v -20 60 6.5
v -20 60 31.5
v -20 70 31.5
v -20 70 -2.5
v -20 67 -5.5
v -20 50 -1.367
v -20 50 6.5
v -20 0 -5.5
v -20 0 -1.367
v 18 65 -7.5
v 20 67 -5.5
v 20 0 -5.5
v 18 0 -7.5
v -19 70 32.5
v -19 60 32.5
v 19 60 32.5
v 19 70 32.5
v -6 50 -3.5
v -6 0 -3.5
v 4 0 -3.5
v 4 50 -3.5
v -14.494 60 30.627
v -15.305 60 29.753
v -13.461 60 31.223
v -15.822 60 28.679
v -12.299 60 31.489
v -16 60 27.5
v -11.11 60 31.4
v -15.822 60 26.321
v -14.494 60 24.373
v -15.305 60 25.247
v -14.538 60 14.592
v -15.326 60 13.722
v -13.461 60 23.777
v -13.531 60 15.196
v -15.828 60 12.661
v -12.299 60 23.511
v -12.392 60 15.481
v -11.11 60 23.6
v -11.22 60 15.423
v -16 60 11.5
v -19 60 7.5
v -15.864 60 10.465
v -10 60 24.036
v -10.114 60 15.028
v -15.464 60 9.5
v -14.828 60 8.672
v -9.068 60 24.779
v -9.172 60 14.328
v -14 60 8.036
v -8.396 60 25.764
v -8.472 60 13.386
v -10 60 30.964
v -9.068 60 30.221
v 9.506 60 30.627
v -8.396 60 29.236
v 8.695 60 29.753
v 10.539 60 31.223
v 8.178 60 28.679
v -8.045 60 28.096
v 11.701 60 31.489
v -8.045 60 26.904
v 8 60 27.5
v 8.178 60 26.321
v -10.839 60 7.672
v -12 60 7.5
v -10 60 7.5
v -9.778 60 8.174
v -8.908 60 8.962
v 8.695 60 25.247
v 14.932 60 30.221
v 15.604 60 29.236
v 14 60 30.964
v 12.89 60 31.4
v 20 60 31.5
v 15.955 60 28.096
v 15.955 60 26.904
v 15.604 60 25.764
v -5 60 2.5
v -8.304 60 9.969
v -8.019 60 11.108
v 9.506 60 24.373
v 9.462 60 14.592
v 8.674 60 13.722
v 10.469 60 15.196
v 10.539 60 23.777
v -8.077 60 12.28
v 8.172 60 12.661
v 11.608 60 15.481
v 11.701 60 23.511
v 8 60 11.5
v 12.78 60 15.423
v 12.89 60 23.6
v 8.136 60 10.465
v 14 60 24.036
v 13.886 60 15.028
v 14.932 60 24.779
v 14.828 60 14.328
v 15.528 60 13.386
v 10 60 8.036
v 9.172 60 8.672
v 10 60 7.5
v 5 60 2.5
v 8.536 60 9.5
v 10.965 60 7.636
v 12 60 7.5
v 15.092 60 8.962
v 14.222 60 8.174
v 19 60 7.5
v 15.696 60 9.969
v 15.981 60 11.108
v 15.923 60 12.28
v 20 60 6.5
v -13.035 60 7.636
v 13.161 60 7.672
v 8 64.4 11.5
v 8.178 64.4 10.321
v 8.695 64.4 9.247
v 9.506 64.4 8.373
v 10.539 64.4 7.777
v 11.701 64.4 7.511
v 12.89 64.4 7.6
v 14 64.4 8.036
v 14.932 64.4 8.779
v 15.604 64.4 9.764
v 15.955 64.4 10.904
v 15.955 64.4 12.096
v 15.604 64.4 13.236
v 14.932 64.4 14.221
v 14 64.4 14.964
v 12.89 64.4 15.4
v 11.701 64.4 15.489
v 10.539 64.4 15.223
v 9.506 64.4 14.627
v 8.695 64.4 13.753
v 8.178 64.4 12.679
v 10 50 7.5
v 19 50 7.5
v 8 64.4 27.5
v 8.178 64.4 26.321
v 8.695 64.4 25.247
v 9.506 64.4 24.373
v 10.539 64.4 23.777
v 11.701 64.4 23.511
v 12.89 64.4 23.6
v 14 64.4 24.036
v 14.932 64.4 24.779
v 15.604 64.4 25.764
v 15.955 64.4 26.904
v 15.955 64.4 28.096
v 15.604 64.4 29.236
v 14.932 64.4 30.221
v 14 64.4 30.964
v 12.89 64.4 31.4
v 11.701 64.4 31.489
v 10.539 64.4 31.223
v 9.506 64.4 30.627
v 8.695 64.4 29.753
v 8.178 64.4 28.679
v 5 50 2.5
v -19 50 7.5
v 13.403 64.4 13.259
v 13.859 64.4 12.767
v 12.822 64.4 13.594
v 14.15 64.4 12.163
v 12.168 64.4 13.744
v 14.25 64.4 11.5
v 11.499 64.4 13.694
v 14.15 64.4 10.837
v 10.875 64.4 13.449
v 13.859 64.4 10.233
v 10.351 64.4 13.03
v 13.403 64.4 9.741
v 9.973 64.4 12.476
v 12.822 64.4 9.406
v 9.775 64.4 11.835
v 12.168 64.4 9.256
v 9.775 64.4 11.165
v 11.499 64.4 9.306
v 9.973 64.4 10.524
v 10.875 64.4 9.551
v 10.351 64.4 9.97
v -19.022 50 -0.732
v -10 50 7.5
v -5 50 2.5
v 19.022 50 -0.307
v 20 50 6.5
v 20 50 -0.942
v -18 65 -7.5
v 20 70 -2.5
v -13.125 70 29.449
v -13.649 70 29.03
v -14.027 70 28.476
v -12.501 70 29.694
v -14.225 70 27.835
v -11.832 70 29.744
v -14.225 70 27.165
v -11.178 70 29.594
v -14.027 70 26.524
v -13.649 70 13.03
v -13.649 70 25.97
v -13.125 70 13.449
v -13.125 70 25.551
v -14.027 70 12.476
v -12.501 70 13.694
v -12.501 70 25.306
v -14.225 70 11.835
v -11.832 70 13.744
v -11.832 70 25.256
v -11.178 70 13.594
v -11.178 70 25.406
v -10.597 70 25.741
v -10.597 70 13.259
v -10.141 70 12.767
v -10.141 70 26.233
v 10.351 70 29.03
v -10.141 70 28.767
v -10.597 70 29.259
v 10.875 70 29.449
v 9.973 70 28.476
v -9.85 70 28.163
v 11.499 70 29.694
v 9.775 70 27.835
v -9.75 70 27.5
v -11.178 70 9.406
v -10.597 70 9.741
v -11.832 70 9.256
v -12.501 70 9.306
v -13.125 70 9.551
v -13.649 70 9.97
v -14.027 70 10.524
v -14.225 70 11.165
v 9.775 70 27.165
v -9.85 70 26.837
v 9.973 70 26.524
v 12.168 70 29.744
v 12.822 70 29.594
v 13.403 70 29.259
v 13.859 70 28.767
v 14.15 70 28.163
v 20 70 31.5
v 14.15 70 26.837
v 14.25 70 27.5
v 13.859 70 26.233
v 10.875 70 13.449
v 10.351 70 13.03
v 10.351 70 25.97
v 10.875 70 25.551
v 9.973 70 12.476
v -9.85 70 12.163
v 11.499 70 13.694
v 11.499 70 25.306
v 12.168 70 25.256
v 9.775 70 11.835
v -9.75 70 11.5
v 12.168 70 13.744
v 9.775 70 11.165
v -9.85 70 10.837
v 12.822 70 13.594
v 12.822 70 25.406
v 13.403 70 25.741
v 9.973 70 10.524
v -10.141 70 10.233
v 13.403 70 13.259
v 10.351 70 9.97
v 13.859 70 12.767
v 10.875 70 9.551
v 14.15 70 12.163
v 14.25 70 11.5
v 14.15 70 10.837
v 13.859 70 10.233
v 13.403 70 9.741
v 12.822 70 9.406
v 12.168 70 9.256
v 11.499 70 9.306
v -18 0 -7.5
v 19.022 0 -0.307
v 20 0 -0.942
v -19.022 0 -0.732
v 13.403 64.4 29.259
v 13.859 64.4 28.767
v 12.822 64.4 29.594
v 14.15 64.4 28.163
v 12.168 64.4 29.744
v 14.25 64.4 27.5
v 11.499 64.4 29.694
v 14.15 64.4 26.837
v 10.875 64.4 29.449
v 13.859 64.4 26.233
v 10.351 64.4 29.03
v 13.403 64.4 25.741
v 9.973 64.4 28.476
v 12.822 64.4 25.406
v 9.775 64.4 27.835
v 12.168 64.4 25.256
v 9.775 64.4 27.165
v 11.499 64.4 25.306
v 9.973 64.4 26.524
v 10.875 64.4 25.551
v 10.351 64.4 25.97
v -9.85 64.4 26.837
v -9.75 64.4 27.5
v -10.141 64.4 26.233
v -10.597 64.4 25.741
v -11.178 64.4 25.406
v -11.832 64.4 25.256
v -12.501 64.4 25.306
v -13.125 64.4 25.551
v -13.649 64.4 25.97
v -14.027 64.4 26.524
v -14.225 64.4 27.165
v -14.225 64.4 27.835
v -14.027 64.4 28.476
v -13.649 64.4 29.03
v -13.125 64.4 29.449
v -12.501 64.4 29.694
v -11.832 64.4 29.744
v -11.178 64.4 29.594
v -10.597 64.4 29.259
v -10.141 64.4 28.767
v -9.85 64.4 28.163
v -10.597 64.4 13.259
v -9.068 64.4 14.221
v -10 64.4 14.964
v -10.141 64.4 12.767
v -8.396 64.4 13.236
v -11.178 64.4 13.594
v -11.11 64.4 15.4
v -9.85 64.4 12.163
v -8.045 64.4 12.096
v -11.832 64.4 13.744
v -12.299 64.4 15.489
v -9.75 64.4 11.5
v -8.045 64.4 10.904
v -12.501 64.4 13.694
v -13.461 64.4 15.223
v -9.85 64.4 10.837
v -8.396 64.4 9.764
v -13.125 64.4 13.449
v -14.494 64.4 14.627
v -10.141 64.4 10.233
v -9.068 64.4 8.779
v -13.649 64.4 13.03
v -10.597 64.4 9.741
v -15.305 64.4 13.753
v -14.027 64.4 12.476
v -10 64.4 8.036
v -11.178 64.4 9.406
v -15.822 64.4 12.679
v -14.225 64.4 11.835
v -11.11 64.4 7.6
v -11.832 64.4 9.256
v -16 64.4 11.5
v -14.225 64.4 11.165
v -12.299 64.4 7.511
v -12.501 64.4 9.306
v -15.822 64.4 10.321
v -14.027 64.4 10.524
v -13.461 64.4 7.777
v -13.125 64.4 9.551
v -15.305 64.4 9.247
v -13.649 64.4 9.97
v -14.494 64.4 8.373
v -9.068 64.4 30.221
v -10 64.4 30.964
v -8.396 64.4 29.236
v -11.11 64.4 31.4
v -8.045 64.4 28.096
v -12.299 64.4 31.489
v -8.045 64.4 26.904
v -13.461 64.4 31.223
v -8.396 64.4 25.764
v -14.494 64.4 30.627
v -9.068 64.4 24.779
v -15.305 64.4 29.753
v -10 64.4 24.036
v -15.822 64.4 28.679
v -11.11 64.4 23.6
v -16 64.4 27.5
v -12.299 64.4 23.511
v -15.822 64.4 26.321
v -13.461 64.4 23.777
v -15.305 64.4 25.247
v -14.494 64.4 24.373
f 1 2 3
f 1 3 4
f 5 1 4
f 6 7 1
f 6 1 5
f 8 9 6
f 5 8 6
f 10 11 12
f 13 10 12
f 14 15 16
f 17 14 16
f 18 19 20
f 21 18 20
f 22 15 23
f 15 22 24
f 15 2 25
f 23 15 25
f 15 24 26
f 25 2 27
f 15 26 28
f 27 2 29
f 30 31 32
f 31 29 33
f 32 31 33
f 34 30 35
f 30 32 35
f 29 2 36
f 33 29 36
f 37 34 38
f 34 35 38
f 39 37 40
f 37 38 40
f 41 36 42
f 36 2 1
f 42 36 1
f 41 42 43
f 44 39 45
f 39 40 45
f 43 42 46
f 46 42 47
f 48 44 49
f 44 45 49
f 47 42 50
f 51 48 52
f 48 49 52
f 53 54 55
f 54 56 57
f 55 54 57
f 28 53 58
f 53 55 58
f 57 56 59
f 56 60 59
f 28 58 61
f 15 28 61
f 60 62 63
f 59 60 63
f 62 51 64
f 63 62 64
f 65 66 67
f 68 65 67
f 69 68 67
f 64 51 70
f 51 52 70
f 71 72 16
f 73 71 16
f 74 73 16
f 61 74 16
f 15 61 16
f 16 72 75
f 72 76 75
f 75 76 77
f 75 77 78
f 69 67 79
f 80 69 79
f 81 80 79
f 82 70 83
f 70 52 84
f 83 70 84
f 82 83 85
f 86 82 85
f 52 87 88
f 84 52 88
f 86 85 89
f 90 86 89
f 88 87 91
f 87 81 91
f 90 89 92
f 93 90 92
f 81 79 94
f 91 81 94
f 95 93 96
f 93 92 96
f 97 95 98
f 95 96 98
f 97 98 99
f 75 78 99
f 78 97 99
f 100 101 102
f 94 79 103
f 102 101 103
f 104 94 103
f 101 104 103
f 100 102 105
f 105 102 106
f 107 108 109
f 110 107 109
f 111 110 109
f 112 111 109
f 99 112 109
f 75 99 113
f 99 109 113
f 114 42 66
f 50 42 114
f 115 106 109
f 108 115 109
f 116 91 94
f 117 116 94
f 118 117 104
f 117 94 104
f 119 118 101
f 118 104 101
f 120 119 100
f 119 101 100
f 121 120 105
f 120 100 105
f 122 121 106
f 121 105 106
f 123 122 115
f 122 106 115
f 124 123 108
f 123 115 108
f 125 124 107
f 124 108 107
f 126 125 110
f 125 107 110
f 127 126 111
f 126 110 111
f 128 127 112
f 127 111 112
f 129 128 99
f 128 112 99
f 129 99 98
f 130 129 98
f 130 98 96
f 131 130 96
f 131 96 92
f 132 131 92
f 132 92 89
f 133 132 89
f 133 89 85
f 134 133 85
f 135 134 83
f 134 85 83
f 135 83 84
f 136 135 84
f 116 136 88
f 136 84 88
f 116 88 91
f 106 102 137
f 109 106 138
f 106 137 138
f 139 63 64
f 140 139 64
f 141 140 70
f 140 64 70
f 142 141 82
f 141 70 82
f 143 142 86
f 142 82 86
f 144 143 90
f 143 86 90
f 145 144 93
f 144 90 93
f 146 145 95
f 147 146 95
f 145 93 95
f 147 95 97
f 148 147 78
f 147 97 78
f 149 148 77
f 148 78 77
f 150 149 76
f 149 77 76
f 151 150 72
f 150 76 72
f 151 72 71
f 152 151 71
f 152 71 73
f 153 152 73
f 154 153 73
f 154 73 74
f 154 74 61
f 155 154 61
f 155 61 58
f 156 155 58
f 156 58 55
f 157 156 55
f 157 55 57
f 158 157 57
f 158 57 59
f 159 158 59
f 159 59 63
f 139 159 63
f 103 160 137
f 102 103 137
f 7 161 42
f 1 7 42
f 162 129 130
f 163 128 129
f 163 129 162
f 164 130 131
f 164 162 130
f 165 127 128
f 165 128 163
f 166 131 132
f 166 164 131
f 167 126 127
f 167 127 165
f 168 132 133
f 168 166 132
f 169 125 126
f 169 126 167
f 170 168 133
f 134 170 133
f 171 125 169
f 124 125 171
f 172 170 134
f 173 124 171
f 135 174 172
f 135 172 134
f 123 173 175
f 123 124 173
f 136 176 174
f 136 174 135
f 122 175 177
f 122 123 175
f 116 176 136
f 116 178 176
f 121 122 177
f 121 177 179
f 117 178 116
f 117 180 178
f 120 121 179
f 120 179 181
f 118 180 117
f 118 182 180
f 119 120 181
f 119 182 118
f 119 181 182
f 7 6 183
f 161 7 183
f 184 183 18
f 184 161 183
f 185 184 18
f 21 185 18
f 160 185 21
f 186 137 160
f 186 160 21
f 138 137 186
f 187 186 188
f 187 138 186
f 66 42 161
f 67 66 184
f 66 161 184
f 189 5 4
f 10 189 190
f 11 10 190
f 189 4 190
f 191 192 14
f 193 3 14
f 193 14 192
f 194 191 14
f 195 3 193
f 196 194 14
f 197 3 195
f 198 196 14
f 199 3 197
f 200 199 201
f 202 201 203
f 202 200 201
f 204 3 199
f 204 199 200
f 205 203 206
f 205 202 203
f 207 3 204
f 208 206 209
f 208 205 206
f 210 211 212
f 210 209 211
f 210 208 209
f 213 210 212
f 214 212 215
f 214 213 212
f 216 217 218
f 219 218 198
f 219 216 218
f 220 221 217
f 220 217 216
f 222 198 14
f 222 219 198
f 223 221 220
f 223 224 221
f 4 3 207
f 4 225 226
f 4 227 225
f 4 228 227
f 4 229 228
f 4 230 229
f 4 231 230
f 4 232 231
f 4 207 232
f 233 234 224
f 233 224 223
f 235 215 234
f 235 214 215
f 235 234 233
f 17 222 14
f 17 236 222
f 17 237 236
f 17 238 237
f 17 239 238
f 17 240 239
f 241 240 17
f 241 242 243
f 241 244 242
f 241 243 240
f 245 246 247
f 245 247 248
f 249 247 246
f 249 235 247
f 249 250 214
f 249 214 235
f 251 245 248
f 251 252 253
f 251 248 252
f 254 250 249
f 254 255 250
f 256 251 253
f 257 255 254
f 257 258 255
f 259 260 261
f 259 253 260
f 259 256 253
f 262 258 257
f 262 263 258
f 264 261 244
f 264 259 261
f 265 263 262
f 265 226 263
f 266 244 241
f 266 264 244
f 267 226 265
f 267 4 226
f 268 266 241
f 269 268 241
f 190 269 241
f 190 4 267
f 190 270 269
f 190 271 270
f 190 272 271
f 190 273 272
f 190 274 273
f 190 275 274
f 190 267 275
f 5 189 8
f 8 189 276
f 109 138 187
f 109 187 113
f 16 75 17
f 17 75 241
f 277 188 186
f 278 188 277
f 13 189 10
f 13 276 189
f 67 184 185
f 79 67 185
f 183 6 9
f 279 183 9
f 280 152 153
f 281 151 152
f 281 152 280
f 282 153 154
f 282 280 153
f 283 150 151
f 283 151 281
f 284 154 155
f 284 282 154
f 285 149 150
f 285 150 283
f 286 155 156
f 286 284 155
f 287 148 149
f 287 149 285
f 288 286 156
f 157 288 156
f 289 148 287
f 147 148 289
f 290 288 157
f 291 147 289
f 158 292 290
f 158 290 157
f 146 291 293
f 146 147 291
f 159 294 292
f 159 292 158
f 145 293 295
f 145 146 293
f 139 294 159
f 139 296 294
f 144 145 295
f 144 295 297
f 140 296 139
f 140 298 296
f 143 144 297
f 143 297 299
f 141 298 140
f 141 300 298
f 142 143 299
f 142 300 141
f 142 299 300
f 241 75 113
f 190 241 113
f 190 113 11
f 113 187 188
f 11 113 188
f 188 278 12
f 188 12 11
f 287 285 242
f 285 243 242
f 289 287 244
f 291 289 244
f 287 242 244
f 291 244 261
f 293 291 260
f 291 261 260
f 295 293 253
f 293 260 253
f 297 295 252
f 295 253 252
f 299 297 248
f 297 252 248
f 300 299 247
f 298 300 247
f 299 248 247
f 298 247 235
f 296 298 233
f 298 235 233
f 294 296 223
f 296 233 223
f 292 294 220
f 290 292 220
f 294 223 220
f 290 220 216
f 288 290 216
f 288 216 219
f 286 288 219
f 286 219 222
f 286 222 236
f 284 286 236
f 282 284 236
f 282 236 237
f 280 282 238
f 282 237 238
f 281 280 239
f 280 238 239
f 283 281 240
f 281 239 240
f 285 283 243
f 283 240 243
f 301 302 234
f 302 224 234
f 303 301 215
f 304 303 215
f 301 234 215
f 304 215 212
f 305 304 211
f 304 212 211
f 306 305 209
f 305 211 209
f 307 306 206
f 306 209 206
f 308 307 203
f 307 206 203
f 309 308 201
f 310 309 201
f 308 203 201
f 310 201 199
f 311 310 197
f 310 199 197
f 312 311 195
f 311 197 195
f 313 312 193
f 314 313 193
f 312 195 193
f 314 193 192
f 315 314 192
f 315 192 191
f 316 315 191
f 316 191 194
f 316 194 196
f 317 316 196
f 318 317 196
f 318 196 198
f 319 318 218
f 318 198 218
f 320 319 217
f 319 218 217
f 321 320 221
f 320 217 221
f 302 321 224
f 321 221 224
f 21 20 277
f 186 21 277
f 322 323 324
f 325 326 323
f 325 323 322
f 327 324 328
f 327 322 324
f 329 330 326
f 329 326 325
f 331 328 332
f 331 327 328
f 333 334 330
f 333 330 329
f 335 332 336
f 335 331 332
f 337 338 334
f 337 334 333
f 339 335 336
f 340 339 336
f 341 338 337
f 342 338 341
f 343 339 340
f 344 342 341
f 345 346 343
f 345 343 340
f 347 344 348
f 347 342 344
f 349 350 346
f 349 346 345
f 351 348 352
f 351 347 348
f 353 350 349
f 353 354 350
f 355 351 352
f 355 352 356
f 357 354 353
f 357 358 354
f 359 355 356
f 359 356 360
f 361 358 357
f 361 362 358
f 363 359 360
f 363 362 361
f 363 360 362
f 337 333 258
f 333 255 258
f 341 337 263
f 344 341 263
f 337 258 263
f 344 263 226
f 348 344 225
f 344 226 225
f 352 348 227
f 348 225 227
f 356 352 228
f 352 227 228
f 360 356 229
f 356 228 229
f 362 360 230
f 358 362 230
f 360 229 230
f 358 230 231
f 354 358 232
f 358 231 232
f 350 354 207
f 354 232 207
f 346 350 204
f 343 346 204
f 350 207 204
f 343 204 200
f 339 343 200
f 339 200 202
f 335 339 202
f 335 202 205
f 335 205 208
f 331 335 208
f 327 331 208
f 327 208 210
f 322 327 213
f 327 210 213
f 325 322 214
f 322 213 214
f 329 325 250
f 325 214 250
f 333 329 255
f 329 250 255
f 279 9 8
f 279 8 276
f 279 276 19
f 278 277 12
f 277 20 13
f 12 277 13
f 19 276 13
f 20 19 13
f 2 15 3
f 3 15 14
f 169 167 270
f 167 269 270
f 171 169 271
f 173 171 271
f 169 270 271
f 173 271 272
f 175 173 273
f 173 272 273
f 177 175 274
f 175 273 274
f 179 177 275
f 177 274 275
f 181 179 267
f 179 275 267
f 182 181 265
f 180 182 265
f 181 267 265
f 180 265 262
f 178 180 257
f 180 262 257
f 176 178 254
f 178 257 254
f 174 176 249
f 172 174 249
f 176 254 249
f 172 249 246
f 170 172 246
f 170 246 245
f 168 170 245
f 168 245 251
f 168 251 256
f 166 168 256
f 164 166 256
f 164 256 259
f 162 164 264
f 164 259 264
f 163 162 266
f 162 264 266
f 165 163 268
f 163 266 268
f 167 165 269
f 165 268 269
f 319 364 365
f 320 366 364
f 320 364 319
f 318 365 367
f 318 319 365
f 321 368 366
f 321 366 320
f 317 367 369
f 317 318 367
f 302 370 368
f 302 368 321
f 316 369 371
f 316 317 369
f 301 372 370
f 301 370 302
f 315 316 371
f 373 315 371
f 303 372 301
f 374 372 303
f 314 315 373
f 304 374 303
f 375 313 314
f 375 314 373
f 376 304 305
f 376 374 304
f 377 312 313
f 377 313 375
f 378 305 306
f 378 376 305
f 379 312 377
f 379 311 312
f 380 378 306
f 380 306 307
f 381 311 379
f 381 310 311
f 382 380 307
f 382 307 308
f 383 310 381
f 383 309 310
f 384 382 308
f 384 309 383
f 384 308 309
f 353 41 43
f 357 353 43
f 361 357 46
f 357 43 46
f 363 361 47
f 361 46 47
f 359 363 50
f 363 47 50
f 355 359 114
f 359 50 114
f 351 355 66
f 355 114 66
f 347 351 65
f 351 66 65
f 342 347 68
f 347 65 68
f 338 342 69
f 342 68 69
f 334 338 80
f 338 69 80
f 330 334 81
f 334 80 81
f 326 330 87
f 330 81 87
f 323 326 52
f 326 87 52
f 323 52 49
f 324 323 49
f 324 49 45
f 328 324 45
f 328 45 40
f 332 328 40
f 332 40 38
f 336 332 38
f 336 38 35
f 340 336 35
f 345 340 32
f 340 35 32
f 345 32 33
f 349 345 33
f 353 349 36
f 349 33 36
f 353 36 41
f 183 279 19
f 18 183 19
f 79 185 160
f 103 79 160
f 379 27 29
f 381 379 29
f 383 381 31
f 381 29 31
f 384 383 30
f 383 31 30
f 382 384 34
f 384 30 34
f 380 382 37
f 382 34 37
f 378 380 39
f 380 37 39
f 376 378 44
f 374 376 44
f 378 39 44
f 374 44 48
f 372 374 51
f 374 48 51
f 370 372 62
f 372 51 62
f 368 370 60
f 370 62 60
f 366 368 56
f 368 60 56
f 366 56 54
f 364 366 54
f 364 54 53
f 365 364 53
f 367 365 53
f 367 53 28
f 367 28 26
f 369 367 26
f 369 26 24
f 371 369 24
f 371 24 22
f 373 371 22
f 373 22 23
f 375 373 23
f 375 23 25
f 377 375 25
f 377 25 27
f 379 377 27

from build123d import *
from OCP.BRepFilletAPI import BRepFilletAPI_MakeChamfer

# Parameters (mm, degrees)
SKETCH_1_W                   = 40
SKETCH_1_H                   = 15
EXTRUDE_1_DEPTH              = 60
SKETCH_3_W                   = 40
SKETCH_3_H                   = 40
EXTRUDE_2_DEPTH              = 10
HOLE_WIZARD_M4_1_D           = 4.5
HOLE_WIZARD_M4_1_CBORE_D     = 8
HOLE_WIZARD_M4_1_CBORE_DEPTH = 4.4
CHAMFER_1_SIZE               = 5
CHAMFER_2_SIZE               = 2
CUT_EXTRUDE_2_DEPTH          = 50
CHAMFER_3_SIZE               = 1
CHAMFER_3_SIZE2              = 0.84312817
CUT_EXTRUDE_3_DEPTH          = 10
CHAMFER_4_SIZE               = 1


with BuildPart() as part:
    # 草图1 → 凸台-拉伸1 (new body)
    with BuildSketch(Plane(origin=(0, 0, 0), x_dir=(1, 0, 0), z_dir=(0, 1, 0))):
        Rectangle(SKETCH_1_W, SKETCH_1_H)
    extrude(amount=EXTRUDE_1_DEPTH)

    # 草图3 → 凸台-拉伸2 (add)
    with BuildSketch(Plane(origin=(0, 60, 0), x_dir=(1, 0, 0), z_dir=(0, 1, 0))):
        with Locations((0, -12.5)):
            Rectangle(SKETCH_3_W, SKETCH_3_H)
    extrude(amount=EXTRUDE_2_DEPTH)

    # M4 六角凹头螺钉的柱形沉头孔1 (through all)
    with Locations(Plane(origin=(0, 60, 0), x_dir=(-1, 0, 0), z_dir=(0, -1, 0))):
        with Locations((12, -11.5), (-12, -11.5), (12, -27.5), (-12, -27.5)):
            CounterBoreHole(HOLE_WIZARD_M4_1_D / 2, HOLE_WIZARD_M4_1_CBORE_D / 2, HOLE_WIZARD_M4_1_CBORE_DEPTH)

    # 倒角1
    chamfer_1_edges = [part.edges().sort_by_distance(p)[0] for p in [
        (0, 70, -7.5),
    ]]
    chamfer(chamfer_1_edges, length=CHAMFER_1_SIZE)

    # 倒角2
    chamfer_2_edges = [part.edges().sort_by_distance(p)[0] for p in [
        (-20, 32.5, -7.5),
        (20, 32.5, -7.5),
    ]]
    chamfer(chamfer_2_edges, length=CHAMFER_2_SIZE)

    # 草图7 → 切除-拉伸2 (cut)
    with BuildSketch(Plane.XZ):
        Polygon((-6, -3.5), (4, -3.5), (25.464703606, 1.062463596), (25.464703606, 11.878030996), (-23.00207338, 11.878030996), (-23.00207338, 0.113902259), align=None)
    extrude(amount=-CUT_EXTRUDE_2_DEPTH, mode=Mode.SUBTRACT)

    # 倒角3: one chamfer whose edges measure the first distance from different faces: ONE call of the kernel's chamfer builder (chamfer() names one face for all edges)
    chamfer_3_edges_1 = [part.edges().sort_by_distance(p)[0] for p in [
        (-20, 25, -0.524208137),
    ]]
    chamfer_3_side_1 = [part.faces().sort_by_distance(p)[0] for p in [
        (-13, 25, -2.012104068),
    ]]
    chamfer_3_edges_2 = [part.edges().sort_by_distance(p)[0] for p in [
        (20, 25, -0.099095013),
    ]]
    chamfer_3_side_2 = [part.faces().sort_by_distance(p)[0] for p in [
        (12, 25, -1.799547507),
    ]]
    chamfer_3 = BRepFilletAPI_MakeChamfer(part.part.solid().wrapped)
    for e in chamfer_3_edges_1:
        chamfer_3.Add(CHAMFER_3_SIZE, CHAMFER_3_SIZE2, e.wrapped, chamfer_3_side_1[0].wrapped)  # the first distance lies on this face
    for e in chamfer_3_edges_2:
        chamfer_3.Add(CHAMFER_3_SIZE, CHAMFER_3_SIZE2, e.wrapped, chamfer_3_side_2[0].wrapped)  # the first distance lies on this face
    add(Compound.cast(chamfer_3.Shape()), mode=Mode.REPLACE)

    # 草图8 → 切除-拉伸3 (cut)
    with BuildSketch(Plane.XZ.offset(-50)):
        Polygon((-10, 7.5), (-5, 2.5), (5, 2.5), (10, 7.5), align=None)
    extrude(amount=-CUT_EXTRUDE_3_DEPTH, mode=Mode.SUBTRACT)

    # 倒角4
    chamfer_4_edges = [part.edges().sort_by_distance(p)[0] for p in [
        (-20, 65, 32.5),
        (20, 65, 32.5),
        (-20, 55, 7.5),
        (20, 55, 7.5),
    ]]
    chamfer(chamfer_4_edges, length=CHAMFER_4_SIZE)


solid = part.part
